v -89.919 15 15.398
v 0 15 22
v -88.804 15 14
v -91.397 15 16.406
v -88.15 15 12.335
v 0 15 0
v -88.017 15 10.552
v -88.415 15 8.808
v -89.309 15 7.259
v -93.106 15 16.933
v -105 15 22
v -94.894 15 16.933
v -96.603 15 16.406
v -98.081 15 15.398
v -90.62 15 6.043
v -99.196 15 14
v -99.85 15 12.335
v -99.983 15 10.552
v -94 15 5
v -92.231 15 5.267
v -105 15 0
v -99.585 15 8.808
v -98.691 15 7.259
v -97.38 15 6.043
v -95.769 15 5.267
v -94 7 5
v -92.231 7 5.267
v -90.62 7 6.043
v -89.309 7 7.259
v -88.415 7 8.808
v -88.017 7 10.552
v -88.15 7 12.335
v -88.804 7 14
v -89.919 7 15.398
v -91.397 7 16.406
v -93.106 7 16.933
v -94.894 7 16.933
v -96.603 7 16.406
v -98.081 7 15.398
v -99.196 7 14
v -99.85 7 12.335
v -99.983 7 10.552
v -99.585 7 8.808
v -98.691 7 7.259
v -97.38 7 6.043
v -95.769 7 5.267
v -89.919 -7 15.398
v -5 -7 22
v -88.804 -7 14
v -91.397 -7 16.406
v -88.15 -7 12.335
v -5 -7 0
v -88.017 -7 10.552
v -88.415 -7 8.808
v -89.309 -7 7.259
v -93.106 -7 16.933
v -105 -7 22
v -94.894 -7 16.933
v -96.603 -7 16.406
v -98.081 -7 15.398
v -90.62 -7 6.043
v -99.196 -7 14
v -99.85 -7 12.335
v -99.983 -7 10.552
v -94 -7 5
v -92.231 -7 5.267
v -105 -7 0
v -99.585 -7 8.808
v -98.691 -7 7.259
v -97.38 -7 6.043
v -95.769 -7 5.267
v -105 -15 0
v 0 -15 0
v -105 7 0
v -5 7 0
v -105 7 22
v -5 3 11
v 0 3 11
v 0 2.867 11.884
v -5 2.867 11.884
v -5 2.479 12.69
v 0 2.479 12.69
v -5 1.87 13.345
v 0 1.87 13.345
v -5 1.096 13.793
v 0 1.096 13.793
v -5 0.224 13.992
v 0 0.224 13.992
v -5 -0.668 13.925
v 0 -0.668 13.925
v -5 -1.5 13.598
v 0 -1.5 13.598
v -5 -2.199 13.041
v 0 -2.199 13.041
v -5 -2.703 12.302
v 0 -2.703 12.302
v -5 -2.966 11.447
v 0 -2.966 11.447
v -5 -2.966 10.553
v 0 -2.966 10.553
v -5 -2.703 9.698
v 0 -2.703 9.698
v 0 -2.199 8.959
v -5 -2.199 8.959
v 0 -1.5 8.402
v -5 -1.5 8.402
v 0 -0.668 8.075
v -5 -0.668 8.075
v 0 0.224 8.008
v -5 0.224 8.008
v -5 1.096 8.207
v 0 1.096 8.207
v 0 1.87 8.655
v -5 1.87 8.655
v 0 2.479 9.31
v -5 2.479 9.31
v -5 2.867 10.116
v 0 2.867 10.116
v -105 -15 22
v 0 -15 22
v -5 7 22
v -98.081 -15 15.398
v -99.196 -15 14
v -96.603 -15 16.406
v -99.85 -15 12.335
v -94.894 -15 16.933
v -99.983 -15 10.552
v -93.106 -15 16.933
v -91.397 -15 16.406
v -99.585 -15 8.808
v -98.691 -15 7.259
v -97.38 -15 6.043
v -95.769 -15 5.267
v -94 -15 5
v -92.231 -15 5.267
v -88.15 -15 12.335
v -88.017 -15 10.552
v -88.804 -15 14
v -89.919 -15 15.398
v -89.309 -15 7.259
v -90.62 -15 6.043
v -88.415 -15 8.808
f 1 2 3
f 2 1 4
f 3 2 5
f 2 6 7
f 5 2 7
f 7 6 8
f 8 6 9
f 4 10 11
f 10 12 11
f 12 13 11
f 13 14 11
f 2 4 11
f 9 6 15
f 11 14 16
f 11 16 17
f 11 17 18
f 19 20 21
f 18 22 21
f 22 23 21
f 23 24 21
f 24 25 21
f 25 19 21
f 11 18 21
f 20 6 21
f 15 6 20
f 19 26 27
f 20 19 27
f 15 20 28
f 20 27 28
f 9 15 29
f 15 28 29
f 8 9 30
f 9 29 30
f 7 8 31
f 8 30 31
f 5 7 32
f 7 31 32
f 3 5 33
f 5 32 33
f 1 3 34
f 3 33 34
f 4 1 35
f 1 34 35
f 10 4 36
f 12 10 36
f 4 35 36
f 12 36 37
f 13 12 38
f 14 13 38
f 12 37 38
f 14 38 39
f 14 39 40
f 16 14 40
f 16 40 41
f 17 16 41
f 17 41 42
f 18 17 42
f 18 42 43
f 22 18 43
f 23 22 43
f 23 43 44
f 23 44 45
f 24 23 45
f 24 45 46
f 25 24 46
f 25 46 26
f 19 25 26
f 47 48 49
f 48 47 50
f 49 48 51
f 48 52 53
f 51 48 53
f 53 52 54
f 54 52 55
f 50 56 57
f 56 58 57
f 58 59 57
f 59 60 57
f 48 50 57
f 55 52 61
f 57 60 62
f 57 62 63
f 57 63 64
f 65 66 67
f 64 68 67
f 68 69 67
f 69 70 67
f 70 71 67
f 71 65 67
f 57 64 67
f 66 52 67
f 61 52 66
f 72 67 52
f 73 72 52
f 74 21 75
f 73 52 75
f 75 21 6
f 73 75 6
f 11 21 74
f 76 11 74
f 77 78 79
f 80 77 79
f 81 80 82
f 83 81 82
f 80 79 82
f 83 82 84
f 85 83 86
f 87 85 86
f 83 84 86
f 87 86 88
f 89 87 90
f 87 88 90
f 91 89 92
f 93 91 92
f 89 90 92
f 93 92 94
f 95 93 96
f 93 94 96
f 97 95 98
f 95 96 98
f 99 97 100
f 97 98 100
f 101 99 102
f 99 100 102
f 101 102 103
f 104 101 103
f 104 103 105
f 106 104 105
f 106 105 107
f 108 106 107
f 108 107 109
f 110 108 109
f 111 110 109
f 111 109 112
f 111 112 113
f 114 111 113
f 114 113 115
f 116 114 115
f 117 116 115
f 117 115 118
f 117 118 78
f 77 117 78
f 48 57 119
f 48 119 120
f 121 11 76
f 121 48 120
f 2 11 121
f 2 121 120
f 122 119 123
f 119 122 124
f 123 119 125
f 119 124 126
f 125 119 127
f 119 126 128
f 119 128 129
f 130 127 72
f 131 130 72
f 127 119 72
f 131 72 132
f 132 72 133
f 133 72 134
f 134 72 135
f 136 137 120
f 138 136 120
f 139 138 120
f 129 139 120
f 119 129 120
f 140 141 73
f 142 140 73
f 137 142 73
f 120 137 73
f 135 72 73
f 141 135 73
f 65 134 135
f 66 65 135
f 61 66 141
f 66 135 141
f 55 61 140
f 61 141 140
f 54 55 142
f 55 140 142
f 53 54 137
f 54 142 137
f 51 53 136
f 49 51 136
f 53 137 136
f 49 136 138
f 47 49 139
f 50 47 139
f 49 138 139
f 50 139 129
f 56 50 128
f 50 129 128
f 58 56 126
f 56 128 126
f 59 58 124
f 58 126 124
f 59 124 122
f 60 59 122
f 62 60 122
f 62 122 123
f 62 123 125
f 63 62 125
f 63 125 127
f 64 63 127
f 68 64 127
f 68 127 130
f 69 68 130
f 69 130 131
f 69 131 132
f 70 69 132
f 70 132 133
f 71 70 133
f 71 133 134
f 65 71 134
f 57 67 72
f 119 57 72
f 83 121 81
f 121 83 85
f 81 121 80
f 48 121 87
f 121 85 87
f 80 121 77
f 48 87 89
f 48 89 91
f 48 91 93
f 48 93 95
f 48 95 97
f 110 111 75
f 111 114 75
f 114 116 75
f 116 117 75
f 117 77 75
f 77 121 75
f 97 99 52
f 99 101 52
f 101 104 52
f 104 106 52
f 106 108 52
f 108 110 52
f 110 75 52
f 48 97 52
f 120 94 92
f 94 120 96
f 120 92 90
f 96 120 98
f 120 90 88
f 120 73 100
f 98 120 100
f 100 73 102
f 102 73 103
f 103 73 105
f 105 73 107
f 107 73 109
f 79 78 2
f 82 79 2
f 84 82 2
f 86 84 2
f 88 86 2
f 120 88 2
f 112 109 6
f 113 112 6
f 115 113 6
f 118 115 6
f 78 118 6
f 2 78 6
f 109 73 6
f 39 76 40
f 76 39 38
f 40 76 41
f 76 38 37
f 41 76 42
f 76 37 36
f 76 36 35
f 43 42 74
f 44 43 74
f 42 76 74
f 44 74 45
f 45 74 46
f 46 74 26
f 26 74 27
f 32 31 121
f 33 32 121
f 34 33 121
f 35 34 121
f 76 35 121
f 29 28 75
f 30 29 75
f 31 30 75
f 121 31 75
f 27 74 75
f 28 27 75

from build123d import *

# Parameters (mm, degrees)
EXTRUDE_1_DEPTH     = 22
SKETCH_2_R          = 6
CUT_EXTRUDE_1_DEPTH = 112.39569112
SKETCH_3_R          = 3
CUT_EXTRUDE_2_DEPTH = 109.323589305


with BuildPart() as part:
    # ｽｹｯﾁ1 → ﾎﾞｽ - 押し出し1 (new body)
    with BuildSketch(Plane.XY):
        Polygon((-105, 15), (-105, 7), (-5, 7), (-5, -7), (-105, -7), (-105, -15), (0, -15), (0, 15), align=None)
    extrude(amount=EXTRUDE_1_DEPTH)

    # ｽｹｯﾁ2 → ｶｯﾄ - 押し出し1 (cut, through all)
    with BuildSketch(Plane.XZ.offset(15)):
        with Locations(Location((-94, 11, 0), (0, 0, 270))):
            Circle(SKETCH_2_R)
    extrude(amount=-CUT_EXTRUDE_1_DEPTH, mode=Mode.SUBTRACT)

    # ｽｹｯﾁ3 → ｶｯﾄ - 押し出し2 (cut, through all)
    with BuildSketch(Plane(origin=(0, 0, 0), x_dir=(0, 0, -1), z_dir=(1, 0, 0))):
        with Locations(Location((-11, 0, 0), (0, 0, 90))):
            Circle(SKETCH_3_R)
    extrude(amount=-CUT_EXTRUDE_2_DEPTH, mode=Mode.SUBTRACT)


solid = part.part
